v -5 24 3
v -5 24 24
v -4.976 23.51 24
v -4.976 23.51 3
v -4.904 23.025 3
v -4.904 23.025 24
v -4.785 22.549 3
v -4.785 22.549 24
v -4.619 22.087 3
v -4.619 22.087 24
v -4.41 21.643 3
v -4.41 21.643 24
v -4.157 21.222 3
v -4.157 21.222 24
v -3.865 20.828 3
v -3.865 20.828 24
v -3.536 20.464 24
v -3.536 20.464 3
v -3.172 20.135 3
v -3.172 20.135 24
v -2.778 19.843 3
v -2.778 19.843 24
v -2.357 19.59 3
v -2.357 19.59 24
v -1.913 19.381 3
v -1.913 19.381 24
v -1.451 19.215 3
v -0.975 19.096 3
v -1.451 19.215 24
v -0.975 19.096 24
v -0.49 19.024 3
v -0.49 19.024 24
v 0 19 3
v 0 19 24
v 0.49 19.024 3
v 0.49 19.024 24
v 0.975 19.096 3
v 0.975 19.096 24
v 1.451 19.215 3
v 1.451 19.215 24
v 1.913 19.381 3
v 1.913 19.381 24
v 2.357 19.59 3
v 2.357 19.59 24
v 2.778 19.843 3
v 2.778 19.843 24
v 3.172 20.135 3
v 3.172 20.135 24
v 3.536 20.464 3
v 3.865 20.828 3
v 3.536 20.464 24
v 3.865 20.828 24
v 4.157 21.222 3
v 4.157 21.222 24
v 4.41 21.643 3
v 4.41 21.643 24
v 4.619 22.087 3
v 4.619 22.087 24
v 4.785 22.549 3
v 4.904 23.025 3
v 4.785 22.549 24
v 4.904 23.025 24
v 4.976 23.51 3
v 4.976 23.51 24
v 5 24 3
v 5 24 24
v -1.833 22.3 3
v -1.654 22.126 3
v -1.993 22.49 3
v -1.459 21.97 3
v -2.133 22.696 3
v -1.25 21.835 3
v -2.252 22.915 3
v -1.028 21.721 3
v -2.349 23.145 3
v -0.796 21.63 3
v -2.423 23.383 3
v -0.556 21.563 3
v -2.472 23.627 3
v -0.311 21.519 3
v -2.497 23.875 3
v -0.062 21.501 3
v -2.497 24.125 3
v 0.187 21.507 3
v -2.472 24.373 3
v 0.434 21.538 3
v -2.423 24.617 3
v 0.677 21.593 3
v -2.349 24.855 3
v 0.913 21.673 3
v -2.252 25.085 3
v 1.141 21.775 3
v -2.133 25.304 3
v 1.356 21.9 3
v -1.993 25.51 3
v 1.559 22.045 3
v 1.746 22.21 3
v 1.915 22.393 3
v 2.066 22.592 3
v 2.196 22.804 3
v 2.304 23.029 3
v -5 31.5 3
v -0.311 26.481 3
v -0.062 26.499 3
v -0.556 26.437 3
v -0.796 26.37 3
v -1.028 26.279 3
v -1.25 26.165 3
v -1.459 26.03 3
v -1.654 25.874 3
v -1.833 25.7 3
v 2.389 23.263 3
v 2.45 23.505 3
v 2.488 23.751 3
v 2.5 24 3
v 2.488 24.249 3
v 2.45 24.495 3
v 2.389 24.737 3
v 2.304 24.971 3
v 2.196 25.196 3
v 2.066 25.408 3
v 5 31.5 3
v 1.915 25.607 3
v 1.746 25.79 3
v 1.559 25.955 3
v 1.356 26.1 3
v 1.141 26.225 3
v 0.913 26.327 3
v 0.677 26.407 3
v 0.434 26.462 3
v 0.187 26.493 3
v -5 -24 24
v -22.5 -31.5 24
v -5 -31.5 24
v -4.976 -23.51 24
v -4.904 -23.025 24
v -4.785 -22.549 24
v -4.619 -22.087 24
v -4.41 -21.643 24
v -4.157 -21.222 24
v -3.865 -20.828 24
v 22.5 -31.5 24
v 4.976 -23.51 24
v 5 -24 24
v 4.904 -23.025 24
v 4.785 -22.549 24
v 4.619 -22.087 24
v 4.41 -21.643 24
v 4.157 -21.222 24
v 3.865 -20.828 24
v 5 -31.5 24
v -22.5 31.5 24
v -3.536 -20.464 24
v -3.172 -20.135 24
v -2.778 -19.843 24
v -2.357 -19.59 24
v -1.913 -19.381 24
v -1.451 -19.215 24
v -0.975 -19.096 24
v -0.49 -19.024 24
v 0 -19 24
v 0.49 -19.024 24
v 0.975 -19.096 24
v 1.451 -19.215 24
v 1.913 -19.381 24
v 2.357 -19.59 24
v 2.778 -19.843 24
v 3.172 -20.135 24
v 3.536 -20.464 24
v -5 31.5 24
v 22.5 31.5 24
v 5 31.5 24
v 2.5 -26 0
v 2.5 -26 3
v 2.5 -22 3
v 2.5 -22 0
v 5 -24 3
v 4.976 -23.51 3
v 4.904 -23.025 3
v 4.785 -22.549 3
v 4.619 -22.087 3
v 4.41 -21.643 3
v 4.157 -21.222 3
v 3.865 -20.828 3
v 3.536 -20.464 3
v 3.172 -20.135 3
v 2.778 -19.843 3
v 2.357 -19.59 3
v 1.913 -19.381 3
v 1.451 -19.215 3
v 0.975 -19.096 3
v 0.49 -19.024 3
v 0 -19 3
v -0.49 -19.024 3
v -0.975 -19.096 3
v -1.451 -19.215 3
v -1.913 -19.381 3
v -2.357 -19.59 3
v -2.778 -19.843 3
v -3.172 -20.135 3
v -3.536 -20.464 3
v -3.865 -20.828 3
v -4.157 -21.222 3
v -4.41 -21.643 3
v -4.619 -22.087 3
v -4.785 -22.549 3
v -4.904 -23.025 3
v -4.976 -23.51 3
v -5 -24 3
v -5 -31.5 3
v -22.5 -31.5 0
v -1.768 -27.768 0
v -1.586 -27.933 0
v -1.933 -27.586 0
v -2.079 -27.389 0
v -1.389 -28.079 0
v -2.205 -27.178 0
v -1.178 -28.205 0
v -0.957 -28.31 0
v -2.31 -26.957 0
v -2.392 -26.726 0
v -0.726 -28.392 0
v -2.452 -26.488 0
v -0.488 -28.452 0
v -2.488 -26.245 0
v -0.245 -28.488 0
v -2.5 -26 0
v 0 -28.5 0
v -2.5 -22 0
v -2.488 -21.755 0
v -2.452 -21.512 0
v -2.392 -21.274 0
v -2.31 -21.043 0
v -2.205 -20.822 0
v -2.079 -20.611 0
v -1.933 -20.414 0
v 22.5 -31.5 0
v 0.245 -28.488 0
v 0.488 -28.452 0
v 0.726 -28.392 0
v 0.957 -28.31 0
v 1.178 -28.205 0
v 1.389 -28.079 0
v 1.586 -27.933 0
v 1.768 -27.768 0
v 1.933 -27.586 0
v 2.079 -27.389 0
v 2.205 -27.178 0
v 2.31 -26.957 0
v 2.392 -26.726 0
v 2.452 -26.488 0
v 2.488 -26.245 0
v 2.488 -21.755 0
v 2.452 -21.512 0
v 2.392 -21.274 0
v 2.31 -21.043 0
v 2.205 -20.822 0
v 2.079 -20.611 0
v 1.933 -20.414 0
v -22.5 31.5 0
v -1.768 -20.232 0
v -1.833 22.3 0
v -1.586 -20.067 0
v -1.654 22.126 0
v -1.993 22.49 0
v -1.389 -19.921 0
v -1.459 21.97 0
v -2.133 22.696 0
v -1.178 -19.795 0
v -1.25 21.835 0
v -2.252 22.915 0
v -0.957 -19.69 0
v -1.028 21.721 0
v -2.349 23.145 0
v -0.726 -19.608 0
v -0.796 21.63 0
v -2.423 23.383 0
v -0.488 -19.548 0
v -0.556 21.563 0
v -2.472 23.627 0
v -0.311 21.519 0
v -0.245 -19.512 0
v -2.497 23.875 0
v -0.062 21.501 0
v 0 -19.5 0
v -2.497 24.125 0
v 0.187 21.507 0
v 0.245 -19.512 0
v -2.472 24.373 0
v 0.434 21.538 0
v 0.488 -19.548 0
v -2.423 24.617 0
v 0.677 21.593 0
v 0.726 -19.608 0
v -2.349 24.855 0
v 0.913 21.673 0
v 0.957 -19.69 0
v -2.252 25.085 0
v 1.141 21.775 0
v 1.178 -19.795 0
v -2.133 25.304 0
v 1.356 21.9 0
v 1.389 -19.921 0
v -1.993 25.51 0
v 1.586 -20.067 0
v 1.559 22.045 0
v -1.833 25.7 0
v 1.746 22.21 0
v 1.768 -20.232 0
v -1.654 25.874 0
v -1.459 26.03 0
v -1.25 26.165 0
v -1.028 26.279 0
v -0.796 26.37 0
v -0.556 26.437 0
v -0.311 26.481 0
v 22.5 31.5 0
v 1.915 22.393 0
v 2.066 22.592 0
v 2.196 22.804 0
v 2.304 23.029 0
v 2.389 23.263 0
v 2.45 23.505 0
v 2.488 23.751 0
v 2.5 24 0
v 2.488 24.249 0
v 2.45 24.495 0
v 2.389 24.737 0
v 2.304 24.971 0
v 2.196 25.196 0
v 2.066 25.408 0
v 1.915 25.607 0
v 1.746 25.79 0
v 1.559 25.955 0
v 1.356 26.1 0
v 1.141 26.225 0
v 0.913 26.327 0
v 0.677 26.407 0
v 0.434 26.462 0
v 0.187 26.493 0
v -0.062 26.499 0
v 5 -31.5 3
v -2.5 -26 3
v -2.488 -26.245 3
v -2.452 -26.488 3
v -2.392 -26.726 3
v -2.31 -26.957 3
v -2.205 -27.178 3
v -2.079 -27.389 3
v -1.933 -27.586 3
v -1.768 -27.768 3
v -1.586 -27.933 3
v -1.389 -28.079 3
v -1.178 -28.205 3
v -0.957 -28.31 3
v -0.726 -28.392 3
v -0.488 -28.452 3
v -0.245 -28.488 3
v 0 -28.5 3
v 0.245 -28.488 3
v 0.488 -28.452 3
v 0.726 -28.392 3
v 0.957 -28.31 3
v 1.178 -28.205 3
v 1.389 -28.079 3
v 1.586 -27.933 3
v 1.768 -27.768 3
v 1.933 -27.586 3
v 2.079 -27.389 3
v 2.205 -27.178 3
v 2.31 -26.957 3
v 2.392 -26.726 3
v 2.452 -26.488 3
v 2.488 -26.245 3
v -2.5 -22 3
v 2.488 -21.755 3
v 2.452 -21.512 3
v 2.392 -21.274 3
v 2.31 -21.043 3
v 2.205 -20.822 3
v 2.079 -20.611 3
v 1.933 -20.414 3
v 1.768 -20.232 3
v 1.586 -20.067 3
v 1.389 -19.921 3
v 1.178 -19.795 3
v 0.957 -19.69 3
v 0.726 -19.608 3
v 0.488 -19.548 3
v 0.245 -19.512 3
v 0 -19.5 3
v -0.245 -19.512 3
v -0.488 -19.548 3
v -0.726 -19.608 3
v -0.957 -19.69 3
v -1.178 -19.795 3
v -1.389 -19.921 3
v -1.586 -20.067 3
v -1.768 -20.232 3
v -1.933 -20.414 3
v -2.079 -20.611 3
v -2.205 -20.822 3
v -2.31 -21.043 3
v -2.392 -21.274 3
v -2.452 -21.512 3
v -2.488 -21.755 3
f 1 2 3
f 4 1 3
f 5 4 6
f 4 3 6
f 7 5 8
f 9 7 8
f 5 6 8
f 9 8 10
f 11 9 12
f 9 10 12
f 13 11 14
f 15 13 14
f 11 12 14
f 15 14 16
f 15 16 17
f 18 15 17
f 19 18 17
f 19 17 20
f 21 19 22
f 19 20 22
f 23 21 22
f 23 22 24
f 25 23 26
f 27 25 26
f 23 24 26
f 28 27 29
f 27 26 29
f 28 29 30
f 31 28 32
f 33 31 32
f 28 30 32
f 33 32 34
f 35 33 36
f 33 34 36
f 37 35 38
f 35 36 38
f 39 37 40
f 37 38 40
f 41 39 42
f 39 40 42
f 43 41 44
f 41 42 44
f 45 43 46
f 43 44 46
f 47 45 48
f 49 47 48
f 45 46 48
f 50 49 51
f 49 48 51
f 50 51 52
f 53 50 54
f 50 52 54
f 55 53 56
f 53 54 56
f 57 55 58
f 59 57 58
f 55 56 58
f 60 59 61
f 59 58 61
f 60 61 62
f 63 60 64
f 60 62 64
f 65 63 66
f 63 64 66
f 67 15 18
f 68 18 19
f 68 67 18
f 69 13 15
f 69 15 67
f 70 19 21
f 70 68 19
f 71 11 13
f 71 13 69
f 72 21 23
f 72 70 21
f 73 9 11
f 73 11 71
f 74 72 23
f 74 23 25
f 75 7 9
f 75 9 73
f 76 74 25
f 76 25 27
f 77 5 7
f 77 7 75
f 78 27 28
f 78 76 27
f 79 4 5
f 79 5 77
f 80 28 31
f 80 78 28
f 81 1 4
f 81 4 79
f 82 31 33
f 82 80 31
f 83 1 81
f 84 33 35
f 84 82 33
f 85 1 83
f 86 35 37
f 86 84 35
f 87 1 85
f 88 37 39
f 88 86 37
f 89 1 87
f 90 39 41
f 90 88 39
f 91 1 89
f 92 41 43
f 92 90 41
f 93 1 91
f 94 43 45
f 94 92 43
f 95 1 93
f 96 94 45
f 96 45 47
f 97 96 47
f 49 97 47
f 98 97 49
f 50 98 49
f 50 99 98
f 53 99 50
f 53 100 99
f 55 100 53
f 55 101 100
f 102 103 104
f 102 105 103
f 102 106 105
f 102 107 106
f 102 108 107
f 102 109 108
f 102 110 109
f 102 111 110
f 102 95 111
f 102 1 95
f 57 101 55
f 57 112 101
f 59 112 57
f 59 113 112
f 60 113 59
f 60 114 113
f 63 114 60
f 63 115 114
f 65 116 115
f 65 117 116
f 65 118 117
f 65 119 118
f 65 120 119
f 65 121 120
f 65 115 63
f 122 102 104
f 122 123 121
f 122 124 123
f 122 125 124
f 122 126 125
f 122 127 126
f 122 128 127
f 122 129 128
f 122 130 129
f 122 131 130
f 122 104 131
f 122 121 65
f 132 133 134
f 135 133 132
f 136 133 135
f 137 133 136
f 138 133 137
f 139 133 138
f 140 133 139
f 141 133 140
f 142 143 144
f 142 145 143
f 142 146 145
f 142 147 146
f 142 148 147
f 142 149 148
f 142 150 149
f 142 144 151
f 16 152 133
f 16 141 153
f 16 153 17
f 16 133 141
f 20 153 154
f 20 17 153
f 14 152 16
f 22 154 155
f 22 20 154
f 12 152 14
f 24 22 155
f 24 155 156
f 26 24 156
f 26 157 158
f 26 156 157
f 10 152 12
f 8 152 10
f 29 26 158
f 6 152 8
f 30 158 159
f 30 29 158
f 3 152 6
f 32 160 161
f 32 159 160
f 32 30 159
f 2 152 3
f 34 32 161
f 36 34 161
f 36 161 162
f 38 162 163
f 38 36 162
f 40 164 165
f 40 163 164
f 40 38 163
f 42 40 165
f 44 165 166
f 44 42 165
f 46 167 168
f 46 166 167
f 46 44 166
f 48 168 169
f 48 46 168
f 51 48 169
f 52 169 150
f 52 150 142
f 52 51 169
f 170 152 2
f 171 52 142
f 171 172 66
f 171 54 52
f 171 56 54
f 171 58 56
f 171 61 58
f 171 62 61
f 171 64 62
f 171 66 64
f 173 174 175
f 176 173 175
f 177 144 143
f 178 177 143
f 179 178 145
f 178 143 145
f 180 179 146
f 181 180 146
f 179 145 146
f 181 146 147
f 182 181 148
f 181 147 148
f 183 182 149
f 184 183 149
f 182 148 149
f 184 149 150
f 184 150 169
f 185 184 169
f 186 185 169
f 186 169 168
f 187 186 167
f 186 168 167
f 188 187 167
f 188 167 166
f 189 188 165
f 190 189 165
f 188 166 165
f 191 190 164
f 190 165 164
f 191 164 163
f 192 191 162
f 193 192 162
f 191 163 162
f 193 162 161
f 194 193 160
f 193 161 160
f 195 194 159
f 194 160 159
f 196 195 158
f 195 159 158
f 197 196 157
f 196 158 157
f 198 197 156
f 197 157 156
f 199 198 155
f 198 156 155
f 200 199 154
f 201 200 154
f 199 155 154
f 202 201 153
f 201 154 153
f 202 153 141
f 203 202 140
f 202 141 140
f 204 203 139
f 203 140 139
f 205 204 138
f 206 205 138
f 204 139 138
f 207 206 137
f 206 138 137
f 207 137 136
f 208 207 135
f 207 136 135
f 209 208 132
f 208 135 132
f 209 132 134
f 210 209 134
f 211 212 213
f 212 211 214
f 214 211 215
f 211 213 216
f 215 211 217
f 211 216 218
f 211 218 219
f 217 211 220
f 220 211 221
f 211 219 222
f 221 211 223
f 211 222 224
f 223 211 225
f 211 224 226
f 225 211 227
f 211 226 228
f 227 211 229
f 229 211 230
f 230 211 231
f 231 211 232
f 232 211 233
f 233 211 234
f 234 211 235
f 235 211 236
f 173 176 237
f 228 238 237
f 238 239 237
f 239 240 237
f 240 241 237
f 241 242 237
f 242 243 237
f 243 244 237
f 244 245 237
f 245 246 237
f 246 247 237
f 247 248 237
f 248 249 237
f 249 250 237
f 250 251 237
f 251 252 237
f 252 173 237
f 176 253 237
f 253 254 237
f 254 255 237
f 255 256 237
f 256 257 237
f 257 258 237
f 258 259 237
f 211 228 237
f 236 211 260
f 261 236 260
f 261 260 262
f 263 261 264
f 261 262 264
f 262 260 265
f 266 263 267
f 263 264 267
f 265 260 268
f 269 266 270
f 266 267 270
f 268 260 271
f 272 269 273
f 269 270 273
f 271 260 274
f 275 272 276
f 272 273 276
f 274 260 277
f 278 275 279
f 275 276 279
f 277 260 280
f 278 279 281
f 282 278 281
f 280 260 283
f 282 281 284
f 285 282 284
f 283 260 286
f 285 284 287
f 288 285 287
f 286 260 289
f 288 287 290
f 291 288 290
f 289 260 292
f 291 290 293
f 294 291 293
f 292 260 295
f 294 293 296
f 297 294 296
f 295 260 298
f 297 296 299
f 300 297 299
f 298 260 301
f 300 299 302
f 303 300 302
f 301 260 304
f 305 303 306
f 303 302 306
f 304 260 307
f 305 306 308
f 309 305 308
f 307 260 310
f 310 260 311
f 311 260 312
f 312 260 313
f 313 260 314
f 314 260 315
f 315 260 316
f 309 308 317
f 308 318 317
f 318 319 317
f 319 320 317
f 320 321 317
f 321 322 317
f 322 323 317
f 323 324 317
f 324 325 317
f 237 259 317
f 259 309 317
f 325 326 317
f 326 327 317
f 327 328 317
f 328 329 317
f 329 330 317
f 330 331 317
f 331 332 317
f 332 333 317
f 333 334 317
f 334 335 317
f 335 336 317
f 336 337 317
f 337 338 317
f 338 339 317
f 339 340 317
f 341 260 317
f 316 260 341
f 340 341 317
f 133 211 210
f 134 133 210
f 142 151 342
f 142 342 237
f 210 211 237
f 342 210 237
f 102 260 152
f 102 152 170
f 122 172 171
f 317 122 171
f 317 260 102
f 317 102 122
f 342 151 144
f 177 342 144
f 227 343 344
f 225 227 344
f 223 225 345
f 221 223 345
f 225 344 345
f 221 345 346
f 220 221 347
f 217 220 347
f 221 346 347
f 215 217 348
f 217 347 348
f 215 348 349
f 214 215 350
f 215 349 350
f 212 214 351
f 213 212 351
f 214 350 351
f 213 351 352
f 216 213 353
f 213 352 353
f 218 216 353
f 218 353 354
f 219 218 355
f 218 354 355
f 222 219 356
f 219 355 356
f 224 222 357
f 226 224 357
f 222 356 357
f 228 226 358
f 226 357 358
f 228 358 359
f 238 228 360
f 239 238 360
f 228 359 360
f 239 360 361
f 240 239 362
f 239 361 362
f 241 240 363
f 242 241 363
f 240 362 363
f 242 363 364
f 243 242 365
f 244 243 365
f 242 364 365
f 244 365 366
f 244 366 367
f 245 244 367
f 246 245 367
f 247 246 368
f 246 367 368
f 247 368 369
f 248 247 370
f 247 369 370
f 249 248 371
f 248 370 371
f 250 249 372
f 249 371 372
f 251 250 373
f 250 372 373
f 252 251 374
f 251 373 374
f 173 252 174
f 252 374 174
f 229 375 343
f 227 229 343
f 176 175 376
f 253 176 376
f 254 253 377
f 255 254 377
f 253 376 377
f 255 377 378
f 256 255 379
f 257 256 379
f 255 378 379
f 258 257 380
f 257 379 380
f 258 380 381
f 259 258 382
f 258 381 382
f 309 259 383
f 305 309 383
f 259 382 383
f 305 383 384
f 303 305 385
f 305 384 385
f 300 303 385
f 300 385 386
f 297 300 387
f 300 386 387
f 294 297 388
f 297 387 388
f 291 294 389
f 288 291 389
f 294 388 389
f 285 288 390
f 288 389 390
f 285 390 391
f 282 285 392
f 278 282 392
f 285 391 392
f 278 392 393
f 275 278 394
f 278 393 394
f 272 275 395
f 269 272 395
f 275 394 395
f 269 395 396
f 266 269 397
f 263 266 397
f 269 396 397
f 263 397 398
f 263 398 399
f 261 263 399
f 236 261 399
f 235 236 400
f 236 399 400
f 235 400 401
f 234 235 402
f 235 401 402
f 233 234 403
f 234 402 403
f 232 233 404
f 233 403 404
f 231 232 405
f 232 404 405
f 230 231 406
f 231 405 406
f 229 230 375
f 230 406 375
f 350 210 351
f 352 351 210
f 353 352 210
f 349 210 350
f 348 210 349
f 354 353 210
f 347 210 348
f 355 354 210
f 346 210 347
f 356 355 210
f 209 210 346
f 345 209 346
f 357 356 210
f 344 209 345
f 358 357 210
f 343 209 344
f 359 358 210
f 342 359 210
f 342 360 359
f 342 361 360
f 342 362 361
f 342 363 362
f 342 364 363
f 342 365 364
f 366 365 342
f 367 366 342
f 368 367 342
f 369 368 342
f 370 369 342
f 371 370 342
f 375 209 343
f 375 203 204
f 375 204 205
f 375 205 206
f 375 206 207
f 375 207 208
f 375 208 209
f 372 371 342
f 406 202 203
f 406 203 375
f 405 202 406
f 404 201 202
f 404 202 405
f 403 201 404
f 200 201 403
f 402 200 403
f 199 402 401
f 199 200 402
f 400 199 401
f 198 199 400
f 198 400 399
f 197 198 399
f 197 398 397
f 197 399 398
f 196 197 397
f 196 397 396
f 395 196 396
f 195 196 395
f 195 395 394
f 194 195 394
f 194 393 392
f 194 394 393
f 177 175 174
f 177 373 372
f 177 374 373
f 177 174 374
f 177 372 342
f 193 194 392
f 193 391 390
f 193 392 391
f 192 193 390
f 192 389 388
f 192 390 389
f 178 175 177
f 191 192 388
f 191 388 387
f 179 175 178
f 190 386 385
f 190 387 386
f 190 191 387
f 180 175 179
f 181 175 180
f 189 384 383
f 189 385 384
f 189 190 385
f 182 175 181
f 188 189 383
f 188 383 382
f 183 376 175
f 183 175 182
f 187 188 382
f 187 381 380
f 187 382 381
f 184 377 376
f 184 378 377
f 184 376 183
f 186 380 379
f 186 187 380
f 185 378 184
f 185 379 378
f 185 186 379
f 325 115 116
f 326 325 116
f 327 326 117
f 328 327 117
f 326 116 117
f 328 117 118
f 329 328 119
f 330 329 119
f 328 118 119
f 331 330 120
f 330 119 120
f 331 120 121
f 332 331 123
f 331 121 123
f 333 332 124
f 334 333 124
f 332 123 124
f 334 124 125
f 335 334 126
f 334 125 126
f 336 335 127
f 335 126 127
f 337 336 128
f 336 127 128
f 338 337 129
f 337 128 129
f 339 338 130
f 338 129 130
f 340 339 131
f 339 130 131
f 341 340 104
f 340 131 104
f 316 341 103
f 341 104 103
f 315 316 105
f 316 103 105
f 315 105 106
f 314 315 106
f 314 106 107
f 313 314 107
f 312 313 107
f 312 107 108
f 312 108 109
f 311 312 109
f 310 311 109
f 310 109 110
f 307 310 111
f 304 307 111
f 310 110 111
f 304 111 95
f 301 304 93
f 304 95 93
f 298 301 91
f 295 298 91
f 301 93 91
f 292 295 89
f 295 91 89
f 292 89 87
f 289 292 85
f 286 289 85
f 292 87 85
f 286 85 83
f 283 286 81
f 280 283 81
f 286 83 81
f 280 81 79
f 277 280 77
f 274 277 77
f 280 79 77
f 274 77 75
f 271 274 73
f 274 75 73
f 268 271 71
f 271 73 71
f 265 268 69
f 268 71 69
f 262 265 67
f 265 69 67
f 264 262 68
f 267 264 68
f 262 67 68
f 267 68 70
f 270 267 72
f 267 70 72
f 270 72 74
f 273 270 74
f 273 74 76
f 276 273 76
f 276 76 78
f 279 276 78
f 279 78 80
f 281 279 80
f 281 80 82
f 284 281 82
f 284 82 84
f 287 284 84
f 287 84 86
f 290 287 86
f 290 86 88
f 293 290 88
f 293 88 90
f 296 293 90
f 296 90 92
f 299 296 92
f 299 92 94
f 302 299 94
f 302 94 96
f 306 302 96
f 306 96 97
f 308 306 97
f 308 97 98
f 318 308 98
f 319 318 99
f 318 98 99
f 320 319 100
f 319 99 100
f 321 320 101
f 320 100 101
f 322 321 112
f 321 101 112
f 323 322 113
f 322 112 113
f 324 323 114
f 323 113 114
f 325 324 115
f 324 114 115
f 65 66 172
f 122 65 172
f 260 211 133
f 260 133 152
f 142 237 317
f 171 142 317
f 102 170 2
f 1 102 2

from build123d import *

# Parameters (mm, degrees)
F0_W     = 45
F0_H     = 63
F1_DEPTH = 24
F3_DEPTH = 21
F4_R     = 2.5
F5_DEPTH = 3


with BuildPart() as f1:
    # F0 (on Top) → F1 (new body)
    with BuildSketch(Plane.XY):
        Rectangle(F0_W, F0_H)
    extrude(amount=F1_DEPTH)

    # F2 (on face) → F3 (cut)
    with BuildSketch(Plane.XY.offset(24)):
        with BuildLine():
            Line((5, 31.5), (-5, 31.5))
            Line((-5, 31.5), (-5, 24))
            ThreePointArc((-5, 24), (0, 19), (5, 24))
            Line((5, 24), (5, 31.5))
        make_face()
        with BuildLine():
            Line((-5, -24), (-5, -31.5))
            Line((-5, -31.5), (5, -31.5))
            Line((5, -31.5), (5, -24))
            ThreePointArc((5, -24), (0, -19), (-5, -24))
        make_face()
    extrude(amount=-F3_DEPTH, mode=Mode.SUBTRACT)

    # F4 (on face) → F5 (cut, through all)
    with BuildSketch(Plane.XY.offset(3)):
        with Locations((0, 24)):
            Circle(F4_R)
        with BuildLine():
            Line((2.5, -26), (2.5, -22))
            ThreePointArc((2.5, -22), (0, -19.5), (-2.5, -22))
            Line((-2.5, -22), (-2.5, -26))
            ThreePointArc((-2.5, -26), (0, -28.5), (2.5, -26))
        make_face()
    extrude(amount=-F5_DEPTH, mode=Mode.SUBTRACT)


solid = f1.part
